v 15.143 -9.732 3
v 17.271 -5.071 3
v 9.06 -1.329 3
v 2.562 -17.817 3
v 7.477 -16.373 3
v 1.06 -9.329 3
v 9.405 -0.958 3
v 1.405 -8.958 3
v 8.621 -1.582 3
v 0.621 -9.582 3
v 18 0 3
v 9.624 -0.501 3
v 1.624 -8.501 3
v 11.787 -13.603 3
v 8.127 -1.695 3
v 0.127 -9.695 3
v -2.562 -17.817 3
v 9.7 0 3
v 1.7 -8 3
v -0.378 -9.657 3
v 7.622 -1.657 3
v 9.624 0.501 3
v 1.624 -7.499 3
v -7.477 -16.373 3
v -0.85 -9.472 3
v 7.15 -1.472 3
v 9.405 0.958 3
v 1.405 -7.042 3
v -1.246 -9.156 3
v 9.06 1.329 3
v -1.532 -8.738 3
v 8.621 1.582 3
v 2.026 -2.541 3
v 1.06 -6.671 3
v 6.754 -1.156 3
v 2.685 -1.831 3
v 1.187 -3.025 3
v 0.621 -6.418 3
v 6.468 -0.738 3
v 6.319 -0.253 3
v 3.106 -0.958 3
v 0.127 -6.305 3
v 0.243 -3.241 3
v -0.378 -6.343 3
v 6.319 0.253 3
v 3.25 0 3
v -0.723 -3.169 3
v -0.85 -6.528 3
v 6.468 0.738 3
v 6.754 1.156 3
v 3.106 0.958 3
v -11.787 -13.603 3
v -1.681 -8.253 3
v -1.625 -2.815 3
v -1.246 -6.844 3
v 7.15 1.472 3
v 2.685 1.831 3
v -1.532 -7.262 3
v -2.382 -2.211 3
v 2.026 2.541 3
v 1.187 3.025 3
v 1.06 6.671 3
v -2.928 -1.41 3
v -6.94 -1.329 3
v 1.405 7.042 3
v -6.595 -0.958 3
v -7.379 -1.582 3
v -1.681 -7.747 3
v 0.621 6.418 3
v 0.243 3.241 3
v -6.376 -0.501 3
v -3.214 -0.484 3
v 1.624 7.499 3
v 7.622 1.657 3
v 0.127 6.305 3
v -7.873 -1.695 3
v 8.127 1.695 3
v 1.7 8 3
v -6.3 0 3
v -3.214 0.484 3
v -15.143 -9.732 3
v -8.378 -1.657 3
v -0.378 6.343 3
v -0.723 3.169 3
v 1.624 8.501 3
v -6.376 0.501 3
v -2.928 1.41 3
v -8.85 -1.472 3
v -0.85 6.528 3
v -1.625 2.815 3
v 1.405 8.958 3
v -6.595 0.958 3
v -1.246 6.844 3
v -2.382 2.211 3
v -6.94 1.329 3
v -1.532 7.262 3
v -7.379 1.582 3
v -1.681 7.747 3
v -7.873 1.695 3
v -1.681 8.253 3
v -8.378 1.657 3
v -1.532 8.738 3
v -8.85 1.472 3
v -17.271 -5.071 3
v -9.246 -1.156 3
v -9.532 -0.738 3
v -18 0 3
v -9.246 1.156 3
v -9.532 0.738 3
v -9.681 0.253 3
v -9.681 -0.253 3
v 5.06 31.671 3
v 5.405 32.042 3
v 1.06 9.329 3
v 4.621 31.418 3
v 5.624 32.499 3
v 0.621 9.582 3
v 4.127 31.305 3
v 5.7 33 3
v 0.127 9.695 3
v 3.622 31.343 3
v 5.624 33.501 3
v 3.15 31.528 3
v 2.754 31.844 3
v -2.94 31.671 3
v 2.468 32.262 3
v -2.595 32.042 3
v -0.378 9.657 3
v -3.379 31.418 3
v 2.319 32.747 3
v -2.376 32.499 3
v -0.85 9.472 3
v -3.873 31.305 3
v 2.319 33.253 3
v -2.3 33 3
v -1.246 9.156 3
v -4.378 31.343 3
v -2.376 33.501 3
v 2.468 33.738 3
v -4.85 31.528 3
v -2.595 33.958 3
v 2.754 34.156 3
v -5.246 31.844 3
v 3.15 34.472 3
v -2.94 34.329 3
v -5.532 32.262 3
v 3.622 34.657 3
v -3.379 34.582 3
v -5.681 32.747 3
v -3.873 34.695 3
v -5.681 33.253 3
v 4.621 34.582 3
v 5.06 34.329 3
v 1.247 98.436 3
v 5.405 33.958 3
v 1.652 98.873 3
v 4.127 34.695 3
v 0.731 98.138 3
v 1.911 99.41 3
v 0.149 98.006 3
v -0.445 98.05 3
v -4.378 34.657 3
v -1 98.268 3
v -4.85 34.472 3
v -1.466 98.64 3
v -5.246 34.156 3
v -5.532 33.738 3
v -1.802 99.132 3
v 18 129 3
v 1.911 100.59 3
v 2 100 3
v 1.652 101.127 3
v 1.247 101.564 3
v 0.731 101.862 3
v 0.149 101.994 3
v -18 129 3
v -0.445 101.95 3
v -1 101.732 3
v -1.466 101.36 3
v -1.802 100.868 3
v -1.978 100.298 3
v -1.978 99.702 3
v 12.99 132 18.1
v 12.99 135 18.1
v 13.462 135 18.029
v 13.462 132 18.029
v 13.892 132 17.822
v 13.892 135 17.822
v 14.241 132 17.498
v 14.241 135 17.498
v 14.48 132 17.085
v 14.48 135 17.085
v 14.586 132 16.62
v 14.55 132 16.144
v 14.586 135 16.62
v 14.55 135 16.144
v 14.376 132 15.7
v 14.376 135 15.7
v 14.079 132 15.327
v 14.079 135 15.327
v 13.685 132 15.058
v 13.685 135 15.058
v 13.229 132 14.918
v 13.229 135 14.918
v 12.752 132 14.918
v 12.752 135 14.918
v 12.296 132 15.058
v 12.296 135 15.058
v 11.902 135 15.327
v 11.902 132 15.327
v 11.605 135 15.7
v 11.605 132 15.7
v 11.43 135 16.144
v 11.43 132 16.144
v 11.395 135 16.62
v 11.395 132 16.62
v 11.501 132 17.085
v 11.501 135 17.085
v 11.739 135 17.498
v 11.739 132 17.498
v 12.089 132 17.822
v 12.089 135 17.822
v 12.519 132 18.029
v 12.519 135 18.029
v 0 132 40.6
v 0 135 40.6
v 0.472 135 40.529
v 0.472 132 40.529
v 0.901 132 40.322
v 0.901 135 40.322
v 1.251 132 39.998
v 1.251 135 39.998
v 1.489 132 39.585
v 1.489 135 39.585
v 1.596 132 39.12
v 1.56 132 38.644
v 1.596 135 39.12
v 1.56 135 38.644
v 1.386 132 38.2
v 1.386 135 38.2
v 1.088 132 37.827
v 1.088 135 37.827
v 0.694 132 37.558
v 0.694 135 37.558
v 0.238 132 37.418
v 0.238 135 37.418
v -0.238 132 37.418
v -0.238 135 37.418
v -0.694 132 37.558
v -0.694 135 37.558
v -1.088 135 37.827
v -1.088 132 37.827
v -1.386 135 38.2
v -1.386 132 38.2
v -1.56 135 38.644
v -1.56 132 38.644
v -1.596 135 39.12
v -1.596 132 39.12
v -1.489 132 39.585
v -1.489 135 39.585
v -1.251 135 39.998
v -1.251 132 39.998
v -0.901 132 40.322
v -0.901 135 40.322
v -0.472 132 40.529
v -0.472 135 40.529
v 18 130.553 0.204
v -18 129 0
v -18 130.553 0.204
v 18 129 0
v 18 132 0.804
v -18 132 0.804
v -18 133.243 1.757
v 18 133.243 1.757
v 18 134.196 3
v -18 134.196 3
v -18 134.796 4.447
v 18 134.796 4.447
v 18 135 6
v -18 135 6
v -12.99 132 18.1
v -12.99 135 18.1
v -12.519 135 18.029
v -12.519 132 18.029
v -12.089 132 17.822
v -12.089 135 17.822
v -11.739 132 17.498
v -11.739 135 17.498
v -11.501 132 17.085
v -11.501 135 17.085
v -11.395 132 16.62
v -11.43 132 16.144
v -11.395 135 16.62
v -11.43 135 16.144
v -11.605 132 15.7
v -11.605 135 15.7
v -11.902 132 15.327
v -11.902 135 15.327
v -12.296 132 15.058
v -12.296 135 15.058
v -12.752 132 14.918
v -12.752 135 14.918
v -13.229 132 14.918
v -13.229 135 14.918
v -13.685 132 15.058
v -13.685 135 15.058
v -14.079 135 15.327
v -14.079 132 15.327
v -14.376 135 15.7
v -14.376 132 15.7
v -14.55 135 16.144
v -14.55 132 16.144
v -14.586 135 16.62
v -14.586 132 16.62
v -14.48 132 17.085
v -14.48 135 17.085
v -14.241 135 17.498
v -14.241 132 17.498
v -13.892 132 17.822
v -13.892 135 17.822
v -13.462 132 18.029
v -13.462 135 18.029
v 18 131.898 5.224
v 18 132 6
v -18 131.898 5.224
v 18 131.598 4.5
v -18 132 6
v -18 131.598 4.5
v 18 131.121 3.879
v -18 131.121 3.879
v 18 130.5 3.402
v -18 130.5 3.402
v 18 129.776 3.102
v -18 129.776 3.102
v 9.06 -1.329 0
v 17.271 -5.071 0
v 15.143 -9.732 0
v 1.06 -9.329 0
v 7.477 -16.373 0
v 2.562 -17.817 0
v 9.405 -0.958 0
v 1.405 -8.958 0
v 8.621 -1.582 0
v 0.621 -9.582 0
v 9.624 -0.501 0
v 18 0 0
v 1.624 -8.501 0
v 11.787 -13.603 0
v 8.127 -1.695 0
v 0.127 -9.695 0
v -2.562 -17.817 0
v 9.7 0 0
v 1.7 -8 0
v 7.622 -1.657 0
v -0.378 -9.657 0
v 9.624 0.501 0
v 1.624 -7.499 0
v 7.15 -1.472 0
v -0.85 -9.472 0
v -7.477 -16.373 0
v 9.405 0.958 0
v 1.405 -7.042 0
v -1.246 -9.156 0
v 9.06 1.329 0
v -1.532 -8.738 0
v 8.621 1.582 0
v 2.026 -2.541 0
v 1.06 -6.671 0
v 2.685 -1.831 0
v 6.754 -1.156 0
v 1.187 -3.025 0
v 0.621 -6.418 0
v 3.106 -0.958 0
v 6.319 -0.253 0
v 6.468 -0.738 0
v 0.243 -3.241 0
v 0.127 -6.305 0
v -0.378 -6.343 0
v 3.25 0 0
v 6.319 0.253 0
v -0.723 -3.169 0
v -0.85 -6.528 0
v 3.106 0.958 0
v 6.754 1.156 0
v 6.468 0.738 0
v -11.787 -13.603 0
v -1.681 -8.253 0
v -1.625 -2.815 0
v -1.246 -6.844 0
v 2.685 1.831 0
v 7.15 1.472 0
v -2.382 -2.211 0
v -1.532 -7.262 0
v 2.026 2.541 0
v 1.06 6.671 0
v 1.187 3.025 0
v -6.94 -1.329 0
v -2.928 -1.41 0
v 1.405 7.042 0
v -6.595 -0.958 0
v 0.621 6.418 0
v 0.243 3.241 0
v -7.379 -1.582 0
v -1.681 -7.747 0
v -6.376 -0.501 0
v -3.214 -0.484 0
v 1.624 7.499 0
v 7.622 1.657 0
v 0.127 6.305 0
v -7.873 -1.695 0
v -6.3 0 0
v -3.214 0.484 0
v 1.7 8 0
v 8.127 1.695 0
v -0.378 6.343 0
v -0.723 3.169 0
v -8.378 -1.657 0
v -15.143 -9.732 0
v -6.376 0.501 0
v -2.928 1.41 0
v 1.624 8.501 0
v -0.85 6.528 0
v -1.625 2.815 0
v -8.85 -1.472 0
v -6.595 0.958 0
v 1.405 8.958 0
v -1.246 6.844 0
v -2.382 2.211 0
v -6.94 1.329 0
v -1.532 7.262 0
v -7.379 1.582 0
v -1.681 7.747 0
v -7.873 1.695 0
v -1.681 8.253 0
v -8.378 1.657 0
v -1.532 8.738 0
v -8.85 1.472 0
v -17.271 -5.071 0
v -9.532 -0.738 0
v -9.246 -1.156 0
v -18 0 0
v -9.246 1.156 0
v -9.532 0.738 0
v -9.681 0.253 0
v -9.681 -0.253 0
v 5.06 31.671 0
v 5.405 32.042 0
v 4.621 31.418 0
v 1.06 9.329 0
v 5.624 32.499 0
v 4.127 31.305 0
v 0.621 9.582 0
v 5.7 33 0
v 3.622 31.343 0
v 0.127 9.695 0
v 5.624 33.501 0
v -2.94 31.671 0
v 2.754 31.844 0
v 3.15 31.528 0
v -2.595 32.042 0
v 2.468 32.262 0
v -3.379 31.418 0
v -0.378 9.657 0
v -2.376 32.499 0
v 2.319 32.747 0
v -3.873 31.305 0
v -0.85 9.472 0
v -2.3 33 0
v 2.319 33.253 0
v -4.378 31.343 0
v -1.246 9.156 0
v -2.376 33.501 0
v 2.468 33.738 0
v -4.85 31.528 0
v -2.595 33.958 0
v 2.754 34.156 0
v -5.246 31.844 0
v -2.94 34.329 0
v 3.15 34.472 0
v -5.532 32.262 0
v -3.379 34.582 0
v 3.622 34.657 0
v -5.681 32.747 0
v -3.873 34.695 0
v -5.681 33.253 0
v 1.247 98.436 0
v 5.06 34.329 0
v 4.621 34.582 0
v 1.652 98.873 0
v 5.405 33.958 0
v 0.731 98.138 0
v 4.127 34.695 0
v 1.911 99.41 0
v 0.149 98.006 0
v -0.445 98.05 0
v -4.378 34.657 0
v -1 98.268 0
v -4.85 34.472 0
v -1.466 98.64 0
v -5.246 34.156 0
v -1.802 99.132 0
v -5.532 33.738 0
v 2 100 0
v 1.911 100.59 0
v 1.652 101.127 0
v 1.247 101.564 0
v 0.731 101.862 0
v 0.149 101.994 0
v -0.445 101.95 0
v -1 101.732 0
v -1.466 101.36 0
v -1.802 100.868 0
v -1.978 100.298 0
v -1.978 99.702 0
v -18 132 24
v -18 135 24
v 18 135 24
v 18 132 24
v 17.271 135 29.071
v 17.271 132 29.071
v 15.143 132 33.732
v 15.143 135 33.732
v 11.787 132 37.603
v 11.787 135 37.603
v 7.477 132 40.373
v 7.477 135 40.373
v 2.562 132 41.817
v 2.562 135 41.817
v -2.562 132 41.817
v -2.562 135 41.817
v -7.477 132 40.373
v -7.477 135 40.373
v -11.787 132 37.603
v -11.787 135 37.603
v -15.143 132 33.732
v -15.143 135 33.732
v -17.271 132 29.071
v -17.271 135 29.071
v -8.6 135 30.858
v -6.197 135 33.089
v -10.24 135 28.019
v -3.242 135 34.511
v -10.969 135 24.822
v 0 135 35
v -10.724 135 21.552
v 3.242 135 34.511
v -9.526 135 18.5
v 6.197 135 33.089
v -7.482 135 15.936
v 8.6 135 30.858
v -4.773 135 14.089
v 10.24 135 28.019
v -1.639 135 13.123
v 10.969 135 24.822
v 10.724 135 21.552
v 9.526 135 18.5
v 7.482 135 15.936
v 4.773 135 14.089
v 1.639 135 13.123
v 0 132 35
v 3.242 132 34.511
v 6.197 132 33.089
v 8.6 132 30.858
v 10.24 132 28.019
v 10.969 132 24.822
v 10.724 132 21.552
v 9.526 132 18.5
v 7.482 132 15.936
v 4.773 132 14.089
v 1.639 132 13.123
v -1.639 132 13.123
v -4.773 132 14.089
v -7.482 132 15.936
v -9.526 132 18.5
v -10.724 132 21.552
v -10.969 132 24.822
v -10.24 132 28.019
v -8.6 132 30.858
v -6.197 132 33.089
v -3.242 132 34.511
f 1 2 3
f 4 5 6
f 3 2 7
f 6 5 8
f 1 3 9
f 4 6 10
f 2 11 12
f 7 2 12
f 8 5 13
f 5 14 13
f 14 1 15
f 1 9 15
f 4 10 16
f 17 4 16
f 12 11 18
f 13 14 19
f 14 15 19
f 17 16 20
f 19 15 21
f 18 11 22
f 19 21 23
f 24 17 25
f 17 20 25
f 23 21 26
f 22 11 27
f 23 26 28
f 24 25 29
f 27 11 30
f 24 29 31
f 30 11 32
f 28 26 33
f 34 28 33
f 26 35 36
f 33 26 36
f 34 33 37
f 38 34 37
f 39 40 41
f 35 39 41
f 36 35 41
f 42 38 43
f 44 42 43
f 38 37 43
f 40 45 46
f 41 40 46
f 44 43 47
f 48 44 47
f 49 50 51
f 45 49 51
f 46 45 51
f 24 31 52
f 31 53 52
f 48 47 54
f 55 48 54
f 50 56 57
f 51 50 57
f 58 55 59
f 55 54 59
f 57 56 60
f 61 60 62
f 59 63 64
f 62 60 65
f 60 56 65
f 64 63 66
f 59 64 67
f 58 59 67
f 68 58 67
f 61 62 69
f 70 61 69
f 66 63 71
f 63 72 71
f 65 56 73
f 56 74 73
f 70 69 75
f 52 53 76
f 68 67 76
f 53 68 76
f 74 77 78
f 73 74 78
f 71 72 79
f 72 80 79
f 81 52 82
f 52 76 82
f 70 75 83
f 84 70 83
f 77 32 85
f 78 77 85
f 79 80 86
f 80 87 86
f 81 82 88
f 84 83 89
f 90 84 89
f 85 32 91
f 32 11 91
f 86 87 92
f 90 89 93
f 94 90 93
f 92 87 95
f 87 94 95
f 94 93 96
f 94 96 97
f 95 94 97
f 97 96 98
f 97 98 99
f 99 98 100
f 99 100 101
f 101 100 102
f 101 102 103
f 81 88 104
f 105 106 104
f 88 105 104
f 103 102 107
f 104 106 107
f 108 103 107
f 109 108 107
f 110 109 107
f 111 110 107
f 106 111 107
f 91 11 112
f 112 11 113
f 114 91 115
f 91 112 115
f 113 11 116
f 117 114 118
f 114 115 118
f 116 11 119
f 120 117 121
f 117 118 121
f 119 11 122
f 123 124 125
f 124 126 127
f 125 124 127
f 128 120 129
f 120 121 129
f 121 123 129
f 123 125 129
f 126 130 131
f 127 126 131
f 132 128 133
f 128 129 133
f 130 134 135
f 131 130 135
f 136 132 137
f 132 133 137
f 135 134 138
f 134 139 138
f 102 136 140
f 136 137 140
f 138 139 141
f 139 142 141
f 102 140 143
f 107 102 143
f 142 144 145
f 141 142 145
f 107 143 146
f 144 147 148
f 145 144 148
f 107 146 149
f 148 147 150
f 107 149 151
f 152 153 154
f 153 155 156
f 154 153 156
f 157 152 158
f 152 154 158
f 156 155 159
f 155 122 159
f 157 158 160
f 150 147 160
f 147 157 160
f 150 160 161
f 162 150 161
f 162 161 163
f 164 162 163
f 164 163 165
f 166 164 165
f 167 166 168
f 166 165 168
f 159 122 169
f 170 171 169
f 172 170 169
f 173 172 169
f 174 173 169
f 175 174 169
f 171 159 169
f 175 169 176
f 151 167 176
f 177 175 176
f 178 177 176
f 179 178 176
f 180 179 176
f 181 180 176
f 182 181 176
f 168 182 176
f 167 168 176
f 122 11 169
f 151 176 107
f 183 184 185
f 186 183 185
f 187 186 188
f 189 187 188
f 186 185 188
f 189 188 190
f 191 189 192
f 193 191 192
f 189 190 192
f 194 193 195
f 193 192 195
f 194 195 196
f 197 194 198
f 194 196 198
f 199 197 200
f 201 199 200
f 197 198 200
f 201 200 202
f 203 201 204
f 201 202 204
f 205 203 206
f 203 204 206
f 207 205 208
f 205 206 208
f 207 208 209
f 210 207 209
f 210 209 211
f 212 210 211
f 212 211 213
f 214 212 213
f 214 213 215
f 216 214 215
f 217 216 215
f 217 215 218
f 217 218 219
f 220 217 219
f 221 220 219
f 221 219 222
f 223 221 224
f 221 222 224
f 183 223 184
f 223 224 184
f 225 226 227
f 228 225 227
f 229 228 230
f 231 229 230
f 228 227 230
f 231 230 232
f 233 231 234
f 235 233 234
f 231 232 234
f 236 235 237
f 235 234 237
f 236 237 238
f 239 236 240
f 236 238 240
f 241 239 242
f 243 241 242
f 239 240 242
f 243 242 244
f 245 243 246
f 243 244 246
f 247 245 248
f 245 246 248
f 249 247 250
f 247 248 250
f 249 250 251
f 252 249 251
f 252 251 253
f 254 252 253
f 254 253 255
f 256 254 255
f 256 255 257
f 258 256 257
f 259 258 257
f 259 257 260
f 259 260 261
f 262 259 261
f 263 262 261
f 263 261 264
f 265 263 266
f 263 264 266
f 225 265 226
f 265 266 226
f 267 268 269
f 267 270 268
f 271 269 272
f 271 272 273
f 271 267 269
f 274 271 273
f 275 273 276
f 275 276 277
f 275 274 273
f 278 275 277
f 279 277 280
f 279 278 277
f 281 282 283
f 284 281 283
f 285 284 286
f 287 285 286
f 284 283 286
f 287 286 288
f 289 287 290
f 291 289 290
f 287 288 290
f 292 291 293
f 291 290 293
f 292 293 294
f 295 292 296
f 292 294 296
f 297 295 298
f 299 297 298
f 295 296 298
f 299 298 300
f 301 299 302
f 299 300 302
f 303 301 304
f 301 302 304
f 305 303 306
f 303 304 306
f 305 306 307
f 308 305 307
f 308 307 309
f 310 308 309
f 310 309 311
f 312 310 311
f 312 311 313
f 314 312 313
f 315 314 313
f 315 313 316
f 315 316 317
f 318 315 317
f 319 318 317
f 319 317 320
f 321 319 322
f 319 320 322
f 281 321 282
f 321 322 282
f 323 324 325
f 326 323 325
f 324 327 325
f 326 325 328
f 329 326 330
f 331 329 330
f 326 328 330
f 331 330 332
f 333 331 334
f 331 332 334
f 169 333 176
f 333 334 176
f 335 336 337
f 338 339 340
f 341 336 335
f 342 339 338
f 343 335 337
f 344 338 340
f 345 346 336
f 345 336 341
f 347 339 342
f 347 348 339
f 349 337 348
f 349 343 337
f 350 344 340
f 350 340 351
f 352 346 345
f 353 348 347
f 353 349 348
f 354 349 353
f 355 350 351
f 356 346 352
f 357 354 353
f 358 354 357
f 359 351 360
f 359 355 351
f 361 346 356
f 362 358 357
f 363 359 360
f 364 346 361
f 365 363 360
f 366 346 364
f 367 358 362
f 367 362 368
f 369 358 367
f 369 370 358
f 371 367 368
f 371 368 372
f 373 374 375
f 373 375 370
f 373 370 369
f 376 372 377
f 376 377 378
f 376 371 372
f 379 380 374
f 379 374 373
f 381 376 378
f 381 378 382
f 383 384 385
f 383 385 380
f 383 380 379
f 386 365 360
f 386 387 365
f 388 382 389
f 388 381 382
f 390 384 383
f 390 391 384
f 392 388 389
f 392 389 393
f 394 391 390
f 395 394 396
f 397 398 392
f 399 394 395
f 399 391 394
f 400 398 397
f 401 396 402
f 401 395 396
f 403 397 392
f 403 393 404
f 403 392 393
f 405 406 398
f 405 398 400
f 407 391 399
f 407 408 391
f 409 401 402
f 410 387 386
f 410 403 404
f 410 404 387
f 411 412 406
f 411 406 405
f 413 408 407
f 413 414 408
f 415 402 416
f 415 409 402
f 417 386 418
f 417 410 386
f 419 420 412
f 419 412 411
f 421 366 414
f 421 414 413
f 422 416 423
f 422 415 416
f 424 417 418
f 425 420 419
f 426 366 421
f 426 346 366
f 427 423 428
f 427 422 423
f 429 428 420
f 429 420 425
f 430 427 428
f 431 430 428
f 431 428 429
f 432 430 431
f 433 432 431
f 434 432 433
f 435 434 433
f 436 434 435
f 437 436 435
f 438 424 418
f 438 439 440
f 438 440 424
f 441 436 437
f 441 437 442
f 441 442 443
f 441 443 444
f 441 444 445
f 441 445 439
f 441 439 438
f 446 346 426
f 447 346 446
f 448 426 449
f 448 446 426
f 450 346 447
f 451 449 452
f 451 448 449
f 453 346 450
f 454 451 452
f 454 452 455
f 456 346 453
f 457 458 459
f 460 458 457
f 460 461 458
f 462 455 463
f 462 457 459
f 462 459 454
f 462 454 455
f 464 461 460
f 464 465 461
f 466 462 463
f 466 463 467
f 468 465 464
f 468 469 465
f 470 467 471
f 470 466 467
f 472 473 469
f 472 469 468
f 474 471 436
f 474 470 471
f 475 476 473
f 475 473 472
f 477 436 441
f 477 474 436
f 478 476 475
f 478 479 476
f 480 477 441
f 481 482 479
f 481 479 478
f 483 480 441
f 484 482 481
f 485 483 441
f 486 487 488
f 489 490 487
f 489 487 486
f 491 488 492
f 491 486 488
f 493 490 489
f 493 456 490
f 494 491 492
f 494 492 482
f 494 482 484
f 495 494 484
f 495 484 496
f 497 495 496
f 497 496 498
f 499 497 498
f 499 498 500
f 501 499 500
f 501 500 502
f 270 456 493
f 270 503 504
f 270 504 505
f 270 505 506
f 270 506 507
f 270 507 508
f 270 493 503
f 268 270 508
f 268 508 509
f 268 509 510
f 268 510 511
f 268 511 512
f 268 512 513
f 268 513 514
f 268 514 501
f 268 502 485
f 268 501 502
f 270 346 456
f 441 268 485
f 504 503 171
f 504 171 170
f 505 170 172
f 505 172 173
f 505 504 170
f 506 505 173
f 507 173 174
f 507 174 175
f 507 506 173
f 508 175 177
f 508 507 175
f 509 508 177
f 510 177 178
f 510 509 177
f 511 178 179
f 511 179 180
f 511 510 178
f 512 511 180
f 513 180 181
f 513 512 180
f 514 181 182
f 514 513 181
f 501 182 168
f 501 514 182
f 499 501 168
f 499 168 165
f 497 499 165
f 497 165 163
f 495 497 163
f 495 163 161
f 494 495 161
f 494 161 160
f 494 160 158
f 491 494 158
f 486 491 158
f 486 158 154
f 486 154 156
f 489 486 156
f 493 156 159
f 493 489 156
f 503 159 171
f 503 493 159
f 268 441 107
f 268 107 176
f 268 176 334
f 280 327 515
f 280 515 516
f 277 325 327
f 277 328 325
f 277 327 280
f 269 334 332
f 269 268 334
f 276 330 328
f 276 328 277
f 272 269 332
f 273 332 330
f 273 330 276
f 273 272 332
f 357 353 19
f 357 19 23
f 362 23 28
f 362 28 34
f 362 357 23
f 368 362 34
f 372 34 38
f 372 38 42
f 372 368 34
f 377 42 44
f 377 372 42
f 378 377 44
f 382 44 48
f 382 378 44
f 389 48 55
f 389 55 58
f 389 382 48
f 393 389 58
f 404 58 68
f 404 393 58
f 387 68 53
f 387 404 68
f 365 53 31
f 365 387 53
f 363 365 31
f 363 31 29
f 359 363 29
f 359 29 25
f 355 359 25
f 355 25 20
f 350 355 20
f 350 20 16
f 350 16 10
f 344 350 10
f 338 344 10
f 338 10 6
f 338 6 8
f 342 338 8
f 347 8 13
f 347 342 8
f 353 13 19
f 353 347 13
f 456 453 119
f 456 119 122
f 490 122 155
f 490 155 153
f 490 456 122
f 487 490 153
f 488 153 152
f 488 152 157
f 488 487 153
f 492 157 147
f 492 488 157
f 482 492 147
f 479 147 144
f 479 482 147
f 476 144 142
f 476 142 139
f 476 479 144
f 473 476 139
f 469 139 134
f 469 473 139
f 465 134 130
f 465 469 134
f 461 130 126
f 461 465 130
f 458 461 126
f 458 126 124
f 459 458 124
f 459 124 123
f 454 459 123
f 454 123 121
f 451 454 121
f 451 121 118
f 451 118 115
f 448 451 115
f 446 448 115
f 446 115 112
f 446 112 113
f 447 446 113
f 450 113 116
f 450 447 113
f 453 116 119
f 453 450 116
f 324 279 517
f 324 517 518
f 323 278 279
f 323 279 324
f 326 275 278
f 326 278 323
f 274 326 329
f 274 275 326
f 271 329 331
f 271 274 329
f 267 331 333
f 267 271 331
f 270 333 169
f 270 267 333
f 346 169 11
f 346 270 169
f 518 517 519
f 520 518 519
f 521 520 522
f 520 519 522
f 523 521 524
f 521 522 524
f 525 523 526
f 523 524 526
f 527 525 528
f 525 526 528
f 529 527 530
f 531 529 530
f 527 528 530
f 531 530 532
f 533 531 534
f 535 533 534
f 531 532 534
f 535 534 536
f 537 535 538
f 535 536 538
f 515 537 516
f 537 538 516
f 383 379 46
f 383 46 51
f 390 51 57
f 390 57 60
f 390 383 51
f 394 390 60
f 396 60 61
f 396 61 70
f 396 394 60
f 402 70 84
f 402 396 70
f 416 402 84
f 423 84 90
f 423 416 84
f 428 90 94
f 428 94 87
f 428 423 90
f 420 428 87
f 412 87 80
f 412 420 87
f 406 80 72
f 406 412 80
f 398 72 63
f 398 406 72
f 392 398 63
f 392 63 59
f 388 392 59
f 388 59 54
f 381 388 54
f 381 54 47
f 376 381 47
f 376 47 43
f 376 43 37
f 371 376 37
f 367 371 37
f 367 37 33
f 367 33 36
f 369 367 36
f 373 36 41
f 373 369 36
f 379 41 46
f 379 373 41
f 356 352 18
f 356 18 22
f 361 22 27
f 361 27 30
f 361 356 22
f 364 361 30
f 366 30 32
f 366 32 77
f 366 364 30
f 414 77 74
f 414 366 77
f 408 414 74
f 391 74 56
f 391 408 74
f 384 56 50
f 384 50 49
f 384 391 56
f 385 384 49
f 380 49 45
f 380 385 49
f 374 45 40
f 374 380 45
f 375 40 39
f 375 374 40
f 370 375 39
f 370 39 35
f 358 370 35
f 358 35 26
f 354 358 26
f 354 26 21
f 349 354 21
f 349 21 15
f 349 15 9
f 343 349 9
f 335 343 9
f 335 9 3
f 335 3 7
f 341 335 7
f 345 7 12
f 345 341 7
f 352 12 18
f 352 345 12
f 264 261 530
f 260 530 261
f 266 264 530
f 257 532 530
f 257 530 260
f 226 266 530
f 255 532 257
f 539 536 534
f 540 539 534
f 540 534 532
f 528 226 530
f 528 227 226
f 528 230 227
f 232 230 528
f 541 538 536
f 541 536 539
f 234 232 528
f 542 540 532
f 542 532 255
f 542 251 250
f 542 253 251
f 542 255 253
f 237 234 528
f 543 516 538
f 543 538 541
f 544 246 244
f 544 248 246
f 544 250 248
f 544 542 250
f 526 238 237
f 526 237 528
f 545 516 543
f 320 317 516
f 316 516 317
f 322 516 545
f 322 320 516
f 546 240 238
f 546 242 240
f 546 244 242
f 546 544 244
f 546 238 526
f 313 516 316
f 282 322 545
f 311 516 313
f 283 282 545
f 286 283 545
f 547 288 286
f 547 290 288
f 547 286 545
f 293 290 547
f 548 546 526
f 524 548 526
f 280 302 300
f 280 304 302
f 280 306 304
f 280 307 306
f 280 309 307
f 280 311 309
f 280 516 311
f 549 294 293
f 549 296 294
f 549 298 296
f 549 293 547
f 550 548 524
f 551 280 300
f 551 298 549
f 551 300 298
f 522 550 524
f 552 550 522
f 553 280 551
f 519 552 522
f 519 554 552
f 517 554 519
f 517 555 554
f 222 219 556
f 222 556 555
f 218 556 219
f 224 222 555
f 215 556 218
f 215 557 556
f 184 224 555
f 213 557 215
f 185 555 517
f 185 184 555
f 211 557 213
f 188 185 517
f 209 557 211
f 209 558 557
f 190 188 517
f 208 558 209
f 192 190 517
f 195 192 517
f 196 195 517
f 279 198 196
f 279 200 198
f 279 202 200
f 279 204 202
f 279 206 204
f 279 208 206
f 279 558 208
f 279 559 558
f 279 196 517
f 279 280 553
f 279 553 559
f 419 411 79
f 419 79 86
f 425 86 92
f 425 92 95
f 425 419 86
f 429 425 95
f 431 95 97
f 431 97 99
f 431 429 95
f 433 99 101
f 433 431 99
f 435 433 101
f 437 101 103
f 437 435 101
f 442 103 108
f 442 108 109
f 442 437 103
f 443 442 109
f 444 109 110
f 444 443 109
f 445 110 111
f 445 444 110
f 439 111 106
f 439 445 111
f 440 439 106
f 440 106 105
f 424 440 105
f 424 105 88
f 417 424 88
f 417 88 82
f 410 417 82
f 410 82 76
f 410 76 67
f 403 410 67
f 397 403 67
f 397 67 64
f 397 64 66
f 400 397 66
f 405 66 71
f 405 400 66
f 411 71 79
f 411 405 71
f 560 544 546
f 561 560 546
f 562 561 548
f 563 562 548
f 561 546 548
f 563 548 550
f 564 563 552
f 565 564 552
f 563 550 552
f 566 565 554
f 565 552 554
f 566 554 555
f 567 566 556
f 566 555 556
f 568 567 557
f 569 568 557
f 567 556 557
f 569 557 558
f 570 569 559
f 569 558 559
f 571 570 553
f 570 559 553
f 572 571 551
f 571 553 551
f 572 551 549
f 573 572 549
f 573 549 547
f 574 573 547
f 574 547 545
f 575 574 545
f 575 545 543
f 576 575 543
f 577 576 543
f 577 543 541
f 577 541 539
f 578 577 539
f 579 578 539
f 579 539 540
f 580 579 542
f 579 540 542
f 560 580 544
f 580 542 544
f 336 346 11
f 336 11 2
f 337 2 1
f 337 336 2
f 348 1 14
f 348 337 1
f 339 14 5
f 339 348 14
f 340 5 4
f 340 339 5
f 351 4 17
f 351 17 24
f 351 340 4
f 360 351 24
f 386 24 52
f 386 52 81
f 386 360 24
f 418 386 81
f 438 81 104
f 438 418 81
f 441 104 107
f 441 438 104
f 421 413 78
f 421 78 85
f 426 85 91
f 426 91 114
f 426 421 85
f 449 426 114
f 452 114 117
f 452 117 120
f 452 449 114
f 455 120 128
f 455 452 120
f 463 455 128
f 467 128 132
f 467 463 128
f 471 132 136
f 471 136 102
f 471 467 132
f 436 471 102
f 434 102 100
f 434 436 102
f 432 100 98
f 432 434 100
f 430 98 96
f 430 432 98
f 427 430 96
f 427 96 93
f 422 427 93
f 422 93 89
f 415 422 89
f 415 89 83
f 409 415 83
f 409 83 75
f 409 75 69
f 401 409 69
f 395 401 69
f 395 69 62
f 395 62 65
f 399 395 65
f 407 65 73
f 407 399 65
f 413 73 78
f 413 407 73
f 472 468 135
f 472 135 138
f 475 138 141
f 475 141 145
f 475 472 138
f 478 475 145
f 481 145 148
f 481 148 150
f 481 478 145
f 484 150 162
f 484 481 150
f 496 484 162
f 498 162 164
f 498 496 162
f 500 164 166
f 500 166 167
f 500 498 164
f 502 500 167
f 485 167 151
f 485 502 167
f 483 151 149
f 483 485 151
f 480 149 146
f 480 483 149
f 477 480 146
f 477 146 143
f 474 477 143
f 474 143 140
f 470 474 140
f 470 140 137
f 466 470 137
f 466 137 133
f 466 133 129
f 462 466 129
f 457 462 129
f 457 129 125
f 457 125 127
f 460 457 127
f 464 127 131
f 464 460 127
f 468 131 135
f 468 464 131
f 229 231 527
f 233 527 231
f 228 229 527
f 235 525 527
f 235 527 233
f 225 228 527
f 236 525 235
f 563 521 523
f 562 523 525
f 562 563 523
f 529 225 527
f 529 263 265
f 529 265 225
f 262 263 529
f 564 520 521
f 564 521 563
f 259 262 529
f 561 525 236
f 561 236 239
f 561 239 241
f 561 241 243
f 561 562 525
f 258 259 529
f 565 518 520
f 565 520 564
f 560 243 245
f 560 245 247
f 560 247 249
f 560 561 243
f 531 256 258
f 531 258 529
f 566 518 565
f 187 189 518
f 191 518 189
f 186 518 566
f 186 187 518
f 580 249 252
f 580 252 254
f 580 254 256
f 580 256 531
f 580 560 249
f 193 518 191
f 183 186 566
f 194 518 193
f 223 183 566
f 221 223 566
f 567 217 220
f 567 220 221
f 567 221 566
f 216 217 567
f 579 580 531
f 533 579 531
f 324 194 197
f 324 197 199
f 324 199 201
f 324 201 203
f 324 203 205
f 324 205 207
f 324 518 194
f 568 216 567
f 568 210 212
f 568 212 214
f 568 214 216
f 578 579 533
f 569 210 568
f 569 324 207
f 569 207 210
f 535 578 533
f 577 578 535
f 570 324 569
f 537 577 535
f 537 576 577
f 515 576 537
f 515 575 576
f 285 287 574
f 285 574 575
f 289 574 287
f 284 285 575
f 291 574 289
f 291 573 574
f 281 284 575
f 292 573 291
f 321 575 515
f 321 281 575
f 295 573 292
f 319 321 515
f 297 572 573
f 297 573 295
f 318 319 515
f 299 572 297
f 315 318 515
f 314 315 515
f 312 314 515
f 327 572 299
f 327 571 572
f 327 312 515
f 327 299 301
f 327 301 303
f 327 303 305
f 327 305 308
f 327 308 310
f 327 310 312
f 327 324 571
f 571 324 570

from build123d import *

# Parameters (mm, degrees)
SKETCH_1_R                                 = 3.25
SKETCH_1_R_2                               = 1.7
SKETCH_1_R_3                               = 2
F_01_MAIN_PLATE_135_W36_T3_EST_HOLES_DEPTH = 3
SKETCH_2_R                                 = 11
SKETCH_2_R_2                               = 1.6
F_02_FLANGE_H42_HOLE22_EST_DEPTH           = 3
F_03_BEND_INNER_R3_EST_R                   = 3
F_04_BEND_OUTER_R6_EST_R                   = 6


with BuildPart() as part:
    # 草图1 → 01_Main_plate_135_W36_T3_EST_holes (new body)
    with BuildSketch(Plane.XY):
        with BuildLine():
            Line((-18, 0), (-18, 135))
            Line((-18, 135), (18, 135))
            Line((18, 135), (18, 0))
            ThreePointArc((18, 0), (0, -18), (-18, 0))
        make_face()
        Circle(SKETCH_1_R, mode=Mode.SUBTRACT)
        with Locations((-8, 0)):
            Circle(SKETCH_1_R_2, mode=Mode.SUBTRACT)
        with Locations((8, 0)):
            Circle(SKETCH_1_R_2, mode=Mode.SUBTRACT)
        with Locations((0, -8)):
            Circle(SKETCH_1_R_2, mode=Mode.SUBTRACT)
        with Locations((0, 8)):
            Circle(SKETCH_1_R_2, mode=Mode.SUBTRACT)
        with Locations((-4, 33)):
            Circle(SKETCH_1_R_2, mode=Mode.SUBTRACT)
        with Locations((4, 33)):
            Circle(SKETCH_1_R_2, mode=Mode.SUBTRACT)
        with Locations((0, 100)):
            Circle(SKETCH_1_R_3, mode=Mode.SUBTRACT)
    extrude(amount=F_01_MAIN_PLATE_135_W36_T3_EST_HOLES_DEPTH)

    # 草图2 → 02_Flange_H42_hole22_EST (add)
    with BuildSketch(Plane(origin=(0, 135, 0), x_dir=(1, 0, 0), z_dir=(0, 1, 0))):
        with BuildLine():
            Line((-18, 0), (18, 0))
            Line((18, 0), (18, -24))
            ThreePointArc((18, -24), (0, -42), (-18, -24))
            Line((-18, -24), (-18, 0))
        make_face()
        with Locations(Location((0, -24, 0), (0, 0, 270))):
            Circle(SKETCH_2_R, mode=Mode.SUBTRACT)
        with Locations(Location((0, -39, 0), (0, 0, 270))):
            Circle(SKETCH_2_R_2, mode=Mode.SUBTRACT)
        with Locations(Location((-12.990381, -16.5, 0), (0, 0, 270))):
            Circle(SKETCH_2_R_2, mode=Mode.SUBTRACT)
        with Locations(Location((12.990381, -16.5, 0), (0, 0, 270))):
            Circle(SKETCH_2_R_2, mode=Mode.SUBTRACT)
    extrude(amount=-F_02_FLANGE_H42_HOLE22_EST_DEPTH)

    # 03_Bend_inner_R3_EST
    f_03_bend_inner_r3_est_edges = [part.edges().sort_by_distance(p)[0] for p in [
        (0, 132, 3),
    ]]
    fillet(f_03_bend_inner_r3_est_edges, radius=F_03_BEND_INNER_R3_EST_R)

    # 04_Bend_outer_R6_EST
    f_04_bend_outer_r6_est_edges = [part.edges().sort_by_distance(p)[0] for p in [
        (0, 135, 0),
    ]]
    fillet(f_04_bend_outer_r6_est_edges, radius=F_04_BEND_OUTER_R6_EST_R)


solid = part.part
